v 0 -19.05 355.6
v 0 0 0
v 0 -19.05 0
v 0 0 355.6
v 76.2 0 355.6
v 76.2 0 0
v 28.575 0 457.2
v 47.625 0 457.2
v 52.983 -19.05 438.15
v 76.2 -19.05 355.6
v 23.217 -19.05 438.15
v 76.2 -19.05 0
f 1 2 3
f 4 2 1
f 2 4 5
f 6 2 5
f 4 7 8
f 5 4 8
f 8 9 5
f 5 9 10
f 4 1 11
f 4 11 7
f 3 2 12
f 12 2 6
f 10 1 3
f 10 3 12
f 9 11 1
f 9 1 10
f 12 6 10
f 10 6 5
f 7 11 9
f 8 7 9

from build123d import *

# Parameters (mm, degrees)
F0_W     = 76.2
F0_H     = 457.2
F1_DEPTH = 19.05
F3_DEPTH = 19.051
F4_SIZE  = 19.04999


# Not quite as in the source:
# - a fillet or chamfer is up to 0.001 mm smaller than in the source, because OpenCascade refuses the exact size


with BuildPart() as f1:
    # F0 (on Front) → F1 (new body)
    with BuildSketch(Plane.XZ):
        with Locations((38.1, 228.6)):
            Rectangle(F0_W, F0_H)
    extrude(amount=F1_DEPTH)

    # F2 (on face) → F3 (cut, through all)
    with BuildSketch(Plane.XZ.offset(19.05)):
        Polygon((0, 355.6), (28.575, 457.2), (0, 457.2), align=None)
        Polygon((76.2, 457.2), (47.625, 457.2), (76.2, 355.6), align=None)
    extrude(amount=-F3_DEPTH, mode=Mode.SUBTRACT)

    # F4 (size 19.05 in the source; OpenCascade refuses exactly that, so slightly less here)
    f4_edges = [f1.edges().sort_by_distance(p)[0] for p in [
        (38.1, -19.05, 457.2),
    ]]
    chamfer(f4_edges, length=F4_SIZE)


solid = f1.part
